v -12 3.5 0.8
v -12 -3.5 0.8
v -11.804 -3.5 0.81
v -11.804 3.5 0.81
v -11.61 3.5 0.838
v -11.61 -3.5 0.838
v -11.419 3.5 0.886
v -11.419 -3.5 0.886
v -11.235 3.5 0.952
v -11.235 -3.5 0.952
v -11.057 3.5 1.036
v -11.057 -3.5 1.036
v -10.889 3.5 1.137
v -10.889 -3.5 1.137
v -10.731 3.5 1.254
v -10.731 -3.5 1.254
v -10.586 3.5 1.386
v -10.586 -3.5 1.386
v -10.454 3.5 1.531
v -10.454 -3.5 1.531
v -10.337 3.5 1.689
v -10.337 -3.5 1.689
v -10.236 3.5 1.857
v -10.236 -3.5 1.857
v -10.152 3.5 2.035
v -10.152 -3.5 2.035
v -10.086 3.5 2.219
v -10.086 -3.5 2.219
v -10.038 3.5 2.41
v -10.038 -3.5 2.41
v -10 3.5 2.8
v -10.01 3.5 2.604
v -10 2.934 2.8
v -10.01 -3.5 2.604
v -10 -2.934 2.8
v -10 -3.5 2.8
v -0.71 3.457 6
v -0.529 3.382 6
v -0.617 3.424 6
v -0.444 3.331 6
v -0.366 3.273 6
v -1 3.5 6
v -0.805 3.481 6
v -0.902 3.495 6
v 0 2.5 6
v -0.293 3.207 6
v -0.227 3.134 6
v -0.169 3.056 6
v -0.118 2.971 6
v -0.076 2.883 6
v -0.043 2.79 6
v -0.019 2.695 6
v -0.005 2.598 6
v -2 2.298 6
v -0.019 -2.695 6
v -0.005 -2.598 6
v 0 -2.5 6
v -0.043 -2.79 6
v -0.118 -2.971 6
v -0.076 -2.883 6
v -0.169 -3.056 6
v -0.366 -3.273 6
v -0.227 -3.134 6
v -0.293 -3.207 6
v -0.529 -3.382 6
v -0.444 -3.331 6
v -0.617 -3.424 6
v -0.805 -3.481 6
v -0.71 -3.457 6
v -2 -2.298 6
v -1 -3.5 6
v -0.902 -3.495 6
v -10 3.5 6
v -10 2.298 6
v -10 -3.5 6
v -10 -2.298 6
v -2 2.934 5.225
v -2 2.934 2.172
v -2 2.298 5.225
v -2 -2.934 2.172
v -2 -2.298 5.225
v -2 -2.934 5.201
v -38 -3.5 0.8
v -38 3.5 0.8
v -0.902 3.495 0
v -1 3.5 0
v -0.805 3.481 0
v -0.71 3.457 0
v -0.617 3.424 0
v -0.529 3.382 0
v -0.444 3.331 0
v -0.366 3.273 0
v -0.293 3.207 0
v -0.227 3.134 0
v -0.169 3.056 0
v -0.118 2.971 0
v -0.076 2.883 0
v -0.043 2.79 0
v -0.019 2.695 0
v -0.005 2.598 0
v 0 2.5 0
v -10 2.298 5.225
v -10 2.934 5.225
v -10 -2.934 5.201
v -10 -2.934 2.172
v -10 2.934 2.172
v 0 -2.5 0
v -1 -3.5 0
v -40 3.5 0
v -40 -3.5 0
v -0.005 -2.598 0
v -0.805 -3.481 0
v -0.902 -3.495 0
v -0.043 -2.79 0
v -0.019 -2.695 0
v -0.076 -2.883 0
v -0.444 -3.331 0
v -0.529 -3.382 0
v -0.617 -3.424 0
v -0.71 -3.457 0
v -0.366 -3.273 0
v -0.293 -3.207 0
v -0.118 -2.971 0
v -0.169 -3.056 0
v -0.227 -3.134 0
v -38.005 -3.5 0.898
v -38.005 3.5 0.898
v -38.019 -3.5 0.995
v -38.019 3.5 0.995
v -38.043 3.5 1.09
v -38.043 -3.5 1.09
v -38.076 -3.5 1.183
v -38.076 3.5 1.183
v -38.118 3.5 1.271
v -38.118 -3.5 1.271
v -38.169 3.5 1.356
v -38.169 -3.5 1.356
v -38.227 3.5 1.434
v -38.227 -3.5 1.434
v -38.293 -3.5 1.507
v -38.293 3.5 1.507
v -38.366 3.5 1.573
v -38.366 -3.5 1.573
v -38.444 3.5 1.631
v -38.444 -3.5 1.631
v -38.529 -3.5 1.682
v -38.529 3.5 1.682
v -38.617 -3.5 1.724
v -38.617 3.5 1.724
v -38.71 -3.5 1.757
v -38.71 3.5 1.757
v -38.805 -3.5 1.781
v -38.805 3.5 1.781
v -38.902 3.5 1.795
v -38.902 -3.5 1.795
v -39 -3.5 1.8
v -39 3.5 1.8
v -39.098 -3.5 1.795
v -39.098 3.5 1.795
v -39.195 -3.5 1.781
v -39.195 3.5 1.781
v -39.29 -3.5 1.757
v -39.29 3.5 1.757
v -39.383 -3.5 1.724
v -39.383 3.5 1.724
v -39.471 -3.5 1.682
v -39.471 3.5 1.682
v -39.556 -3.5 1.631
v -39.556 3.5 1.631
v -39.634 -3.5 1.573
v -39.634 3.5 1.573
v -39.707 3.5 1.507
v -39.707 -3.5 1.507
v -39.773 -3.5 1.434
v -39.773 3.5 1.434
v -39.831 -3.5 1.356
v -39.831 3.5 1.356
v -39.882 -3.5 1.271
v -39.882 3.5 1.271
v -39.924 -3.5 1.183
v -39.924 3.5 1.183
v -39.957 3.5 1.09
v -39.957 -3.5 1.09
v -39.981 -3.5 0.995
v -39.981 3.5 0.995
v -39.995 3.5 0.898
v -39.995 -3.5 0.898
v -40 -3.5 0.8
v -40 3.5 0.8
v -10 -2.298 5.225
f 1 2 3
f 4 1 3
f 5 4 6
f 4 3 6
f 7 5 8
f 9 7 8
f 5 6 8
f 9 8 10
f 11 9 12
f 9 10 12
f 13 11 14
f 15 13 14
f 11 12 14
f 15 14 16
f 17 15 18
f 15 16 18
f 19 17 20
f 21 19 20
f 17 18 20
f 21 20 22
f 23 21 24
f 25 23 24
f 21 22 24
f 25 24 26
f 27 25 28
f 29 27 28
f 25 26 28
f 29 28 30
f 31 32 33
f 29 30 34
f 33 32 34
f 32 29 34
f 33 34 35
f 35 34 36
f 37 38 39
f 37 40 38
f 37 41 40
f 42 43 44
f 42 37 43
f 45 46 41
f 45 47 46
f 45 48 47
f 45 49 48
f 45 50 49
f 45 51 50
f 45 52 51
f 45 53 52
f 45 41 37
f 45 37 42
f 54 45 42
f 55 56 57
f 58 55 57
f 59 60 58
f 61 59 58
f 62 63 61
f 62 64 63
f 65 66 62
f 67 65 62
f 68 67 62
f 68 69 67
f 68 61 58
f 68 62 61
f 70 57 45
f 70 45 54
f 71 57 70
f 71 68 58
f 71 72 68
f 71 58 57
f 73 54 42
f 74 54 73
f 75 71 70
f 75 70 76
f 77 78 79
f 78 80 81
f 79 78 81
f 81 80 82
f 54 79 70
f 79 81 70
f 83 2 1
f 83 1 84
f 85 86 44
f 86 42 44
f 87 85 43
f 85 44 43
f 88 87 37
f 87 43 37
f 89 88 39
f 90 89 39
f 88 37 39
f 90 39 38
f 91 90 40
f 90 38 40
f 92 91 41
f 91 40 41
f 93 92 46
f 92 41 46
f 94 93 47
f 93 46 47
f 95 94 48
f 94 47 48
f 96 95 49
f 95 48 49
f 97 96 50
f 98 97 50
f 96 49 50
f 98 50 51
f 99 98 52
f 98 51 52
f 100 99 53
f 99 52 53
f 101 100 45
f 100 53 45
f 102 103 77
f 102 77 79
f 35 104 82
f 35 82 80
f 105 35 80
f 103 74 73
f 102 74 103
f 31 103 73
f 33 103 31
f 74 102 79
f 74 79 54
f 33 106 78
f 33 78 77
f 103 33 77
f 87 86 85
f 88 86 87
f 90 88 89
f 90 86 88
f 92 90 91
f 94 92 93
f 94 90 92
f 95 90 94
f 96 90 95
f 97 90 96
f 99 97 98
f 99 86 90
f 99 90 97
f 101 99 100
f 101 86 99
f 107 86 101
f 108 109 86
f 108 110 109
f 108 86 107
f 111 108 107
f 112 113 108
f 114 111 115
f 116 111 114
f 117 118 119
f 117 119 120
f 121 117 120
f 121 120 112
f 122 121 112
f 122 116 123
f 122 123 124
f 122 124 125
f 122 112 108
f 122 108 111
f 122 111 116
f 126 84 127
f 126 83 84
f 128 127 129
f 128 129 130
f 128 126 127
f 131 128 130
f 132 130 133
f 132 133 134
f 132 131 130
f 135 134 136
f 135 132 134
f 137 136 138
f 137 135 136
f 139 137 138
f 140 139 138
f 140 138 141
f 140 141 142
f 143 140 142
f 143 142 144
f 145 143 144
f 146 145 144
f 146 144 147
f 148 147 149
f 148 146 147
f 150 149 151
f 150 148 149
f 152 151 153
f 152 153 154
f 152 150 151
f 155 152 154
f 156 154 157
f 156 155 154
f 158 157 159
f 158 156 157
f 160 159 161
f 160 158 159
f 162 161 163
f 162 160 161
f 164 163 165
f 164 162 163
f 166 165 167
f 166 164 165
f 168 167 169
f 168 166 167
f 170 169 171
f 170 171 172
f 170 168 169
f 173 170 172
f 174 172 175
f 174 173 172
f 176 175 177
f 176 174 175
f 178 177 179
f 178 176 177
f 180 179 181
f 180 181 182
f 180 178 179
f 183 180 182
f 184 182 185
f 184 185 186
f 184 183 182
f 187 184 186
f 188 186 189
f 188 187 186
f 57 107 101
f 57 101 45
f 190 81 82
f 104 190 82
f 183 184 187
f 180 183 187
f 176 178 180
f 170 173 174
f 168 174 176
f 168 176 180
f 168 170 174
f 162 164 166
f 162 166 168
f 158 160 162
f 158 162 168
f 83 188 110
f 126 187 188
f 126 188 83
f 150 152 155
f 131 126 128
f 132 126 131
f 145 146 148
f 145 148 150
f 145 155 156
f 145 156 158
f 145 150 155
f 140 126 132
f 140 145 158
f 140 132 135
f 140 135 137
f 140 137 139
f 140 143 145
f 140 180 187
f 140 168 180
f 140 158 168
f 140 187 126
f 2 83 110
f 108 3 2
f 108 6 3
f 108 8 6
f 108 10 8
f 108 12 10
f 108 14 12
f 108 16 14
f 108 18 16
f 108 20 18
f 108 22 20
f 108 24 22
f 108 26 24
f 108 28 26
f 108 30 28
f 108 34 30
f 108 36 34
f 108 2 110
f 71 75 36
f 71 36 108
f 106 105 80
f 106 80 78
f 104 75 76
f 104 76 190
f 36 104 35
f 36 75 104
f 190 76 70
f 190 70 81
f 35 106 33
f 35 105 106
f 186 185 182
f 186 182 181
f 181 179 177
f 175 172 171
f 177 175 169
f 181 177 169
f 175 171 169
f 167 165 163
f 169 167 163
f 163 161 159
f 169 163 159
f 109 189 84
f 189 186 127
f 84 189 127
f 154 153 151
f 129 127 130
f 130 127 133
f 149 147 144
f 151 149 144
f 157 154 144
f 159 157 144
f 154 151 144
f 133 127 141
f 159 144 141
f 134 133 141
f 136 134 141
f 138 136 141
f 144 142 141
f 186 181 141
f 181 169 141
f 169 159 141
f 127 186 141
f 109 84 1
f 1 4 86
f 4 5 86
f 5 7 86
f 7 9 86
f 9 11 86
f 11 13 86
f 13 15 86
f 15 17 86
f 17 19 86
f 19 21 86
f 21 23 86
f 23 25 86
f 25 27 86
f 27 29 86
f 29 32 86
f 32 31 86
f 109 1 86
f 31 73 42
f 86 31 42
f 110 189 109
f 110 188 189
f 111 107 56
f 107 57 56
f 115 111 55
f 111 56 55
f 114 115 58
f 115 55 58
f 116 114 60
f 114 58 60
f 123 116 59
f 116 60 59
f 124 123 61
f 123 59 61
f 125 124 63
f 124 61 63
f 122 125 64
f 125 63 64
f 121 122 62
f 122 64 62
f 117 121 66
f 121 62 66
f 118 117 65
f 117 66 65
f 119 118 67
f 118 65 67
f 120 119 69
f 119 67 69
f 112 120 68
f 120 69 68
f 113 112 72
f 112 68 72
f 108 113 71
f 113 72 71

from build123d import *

# Parameters (mm, degrees)
PAD_DEPTH    = 3.5
POCKET_DEPTH = 8
FILLET_R     = 1


with BuildPart() as part:
    # Sketch → Pad (new body, symmetric)
    with BuildSketch(Plane.XZ):
        with BuildLine():
            Line((-40, 0), (0, 0))
            Line((0, 0), (0, 6))
            Line((0, 6), (-10, 6))
            Line((-10, 6), (-10, 2.8))
            ThreePointArc((-12, 0.8), (-10.585786, 1.385786), (-10, 2.8))
            Line((-12, 0.8), (-38, 0.8))
            ThreePointArc((-38, 0.8), (-39, 1.8), (-40, 0.8))
            Line((-40, 0.8), (-40, 0))
        make_face()
    extrude(amount=PAD_DEPTH, both=True)

    # Sketch001 → Pocket (cut)
    with BuildSketch(Plane(origin=(-10, 0, 0), x_dir=(0, 0, -1), z_dir=(-1, 0, 0))):
        Polygon((-6, -2.298131), (-6, 2.298131), (-5.224636, 2.298131), (-5.201471, 2.934012), (-2.171837, 2.934012), (-2.171837, -2.934012), (-5.224636, -2.934012), (-5.224636, -2.298131), align=None)
    extrude(amount=-POCKET_DEPTH, mode=Mode.SUBTRACT)

    # Fillet
    fillet_edges = [part.edges().sort_by_distance(p)[0] for p in [
        (0, -3.5, 3),
        (0, 3.5, 3),
    ]]
    fillet(fillet_edges, radius=FILLET_R)


solid = part.part
